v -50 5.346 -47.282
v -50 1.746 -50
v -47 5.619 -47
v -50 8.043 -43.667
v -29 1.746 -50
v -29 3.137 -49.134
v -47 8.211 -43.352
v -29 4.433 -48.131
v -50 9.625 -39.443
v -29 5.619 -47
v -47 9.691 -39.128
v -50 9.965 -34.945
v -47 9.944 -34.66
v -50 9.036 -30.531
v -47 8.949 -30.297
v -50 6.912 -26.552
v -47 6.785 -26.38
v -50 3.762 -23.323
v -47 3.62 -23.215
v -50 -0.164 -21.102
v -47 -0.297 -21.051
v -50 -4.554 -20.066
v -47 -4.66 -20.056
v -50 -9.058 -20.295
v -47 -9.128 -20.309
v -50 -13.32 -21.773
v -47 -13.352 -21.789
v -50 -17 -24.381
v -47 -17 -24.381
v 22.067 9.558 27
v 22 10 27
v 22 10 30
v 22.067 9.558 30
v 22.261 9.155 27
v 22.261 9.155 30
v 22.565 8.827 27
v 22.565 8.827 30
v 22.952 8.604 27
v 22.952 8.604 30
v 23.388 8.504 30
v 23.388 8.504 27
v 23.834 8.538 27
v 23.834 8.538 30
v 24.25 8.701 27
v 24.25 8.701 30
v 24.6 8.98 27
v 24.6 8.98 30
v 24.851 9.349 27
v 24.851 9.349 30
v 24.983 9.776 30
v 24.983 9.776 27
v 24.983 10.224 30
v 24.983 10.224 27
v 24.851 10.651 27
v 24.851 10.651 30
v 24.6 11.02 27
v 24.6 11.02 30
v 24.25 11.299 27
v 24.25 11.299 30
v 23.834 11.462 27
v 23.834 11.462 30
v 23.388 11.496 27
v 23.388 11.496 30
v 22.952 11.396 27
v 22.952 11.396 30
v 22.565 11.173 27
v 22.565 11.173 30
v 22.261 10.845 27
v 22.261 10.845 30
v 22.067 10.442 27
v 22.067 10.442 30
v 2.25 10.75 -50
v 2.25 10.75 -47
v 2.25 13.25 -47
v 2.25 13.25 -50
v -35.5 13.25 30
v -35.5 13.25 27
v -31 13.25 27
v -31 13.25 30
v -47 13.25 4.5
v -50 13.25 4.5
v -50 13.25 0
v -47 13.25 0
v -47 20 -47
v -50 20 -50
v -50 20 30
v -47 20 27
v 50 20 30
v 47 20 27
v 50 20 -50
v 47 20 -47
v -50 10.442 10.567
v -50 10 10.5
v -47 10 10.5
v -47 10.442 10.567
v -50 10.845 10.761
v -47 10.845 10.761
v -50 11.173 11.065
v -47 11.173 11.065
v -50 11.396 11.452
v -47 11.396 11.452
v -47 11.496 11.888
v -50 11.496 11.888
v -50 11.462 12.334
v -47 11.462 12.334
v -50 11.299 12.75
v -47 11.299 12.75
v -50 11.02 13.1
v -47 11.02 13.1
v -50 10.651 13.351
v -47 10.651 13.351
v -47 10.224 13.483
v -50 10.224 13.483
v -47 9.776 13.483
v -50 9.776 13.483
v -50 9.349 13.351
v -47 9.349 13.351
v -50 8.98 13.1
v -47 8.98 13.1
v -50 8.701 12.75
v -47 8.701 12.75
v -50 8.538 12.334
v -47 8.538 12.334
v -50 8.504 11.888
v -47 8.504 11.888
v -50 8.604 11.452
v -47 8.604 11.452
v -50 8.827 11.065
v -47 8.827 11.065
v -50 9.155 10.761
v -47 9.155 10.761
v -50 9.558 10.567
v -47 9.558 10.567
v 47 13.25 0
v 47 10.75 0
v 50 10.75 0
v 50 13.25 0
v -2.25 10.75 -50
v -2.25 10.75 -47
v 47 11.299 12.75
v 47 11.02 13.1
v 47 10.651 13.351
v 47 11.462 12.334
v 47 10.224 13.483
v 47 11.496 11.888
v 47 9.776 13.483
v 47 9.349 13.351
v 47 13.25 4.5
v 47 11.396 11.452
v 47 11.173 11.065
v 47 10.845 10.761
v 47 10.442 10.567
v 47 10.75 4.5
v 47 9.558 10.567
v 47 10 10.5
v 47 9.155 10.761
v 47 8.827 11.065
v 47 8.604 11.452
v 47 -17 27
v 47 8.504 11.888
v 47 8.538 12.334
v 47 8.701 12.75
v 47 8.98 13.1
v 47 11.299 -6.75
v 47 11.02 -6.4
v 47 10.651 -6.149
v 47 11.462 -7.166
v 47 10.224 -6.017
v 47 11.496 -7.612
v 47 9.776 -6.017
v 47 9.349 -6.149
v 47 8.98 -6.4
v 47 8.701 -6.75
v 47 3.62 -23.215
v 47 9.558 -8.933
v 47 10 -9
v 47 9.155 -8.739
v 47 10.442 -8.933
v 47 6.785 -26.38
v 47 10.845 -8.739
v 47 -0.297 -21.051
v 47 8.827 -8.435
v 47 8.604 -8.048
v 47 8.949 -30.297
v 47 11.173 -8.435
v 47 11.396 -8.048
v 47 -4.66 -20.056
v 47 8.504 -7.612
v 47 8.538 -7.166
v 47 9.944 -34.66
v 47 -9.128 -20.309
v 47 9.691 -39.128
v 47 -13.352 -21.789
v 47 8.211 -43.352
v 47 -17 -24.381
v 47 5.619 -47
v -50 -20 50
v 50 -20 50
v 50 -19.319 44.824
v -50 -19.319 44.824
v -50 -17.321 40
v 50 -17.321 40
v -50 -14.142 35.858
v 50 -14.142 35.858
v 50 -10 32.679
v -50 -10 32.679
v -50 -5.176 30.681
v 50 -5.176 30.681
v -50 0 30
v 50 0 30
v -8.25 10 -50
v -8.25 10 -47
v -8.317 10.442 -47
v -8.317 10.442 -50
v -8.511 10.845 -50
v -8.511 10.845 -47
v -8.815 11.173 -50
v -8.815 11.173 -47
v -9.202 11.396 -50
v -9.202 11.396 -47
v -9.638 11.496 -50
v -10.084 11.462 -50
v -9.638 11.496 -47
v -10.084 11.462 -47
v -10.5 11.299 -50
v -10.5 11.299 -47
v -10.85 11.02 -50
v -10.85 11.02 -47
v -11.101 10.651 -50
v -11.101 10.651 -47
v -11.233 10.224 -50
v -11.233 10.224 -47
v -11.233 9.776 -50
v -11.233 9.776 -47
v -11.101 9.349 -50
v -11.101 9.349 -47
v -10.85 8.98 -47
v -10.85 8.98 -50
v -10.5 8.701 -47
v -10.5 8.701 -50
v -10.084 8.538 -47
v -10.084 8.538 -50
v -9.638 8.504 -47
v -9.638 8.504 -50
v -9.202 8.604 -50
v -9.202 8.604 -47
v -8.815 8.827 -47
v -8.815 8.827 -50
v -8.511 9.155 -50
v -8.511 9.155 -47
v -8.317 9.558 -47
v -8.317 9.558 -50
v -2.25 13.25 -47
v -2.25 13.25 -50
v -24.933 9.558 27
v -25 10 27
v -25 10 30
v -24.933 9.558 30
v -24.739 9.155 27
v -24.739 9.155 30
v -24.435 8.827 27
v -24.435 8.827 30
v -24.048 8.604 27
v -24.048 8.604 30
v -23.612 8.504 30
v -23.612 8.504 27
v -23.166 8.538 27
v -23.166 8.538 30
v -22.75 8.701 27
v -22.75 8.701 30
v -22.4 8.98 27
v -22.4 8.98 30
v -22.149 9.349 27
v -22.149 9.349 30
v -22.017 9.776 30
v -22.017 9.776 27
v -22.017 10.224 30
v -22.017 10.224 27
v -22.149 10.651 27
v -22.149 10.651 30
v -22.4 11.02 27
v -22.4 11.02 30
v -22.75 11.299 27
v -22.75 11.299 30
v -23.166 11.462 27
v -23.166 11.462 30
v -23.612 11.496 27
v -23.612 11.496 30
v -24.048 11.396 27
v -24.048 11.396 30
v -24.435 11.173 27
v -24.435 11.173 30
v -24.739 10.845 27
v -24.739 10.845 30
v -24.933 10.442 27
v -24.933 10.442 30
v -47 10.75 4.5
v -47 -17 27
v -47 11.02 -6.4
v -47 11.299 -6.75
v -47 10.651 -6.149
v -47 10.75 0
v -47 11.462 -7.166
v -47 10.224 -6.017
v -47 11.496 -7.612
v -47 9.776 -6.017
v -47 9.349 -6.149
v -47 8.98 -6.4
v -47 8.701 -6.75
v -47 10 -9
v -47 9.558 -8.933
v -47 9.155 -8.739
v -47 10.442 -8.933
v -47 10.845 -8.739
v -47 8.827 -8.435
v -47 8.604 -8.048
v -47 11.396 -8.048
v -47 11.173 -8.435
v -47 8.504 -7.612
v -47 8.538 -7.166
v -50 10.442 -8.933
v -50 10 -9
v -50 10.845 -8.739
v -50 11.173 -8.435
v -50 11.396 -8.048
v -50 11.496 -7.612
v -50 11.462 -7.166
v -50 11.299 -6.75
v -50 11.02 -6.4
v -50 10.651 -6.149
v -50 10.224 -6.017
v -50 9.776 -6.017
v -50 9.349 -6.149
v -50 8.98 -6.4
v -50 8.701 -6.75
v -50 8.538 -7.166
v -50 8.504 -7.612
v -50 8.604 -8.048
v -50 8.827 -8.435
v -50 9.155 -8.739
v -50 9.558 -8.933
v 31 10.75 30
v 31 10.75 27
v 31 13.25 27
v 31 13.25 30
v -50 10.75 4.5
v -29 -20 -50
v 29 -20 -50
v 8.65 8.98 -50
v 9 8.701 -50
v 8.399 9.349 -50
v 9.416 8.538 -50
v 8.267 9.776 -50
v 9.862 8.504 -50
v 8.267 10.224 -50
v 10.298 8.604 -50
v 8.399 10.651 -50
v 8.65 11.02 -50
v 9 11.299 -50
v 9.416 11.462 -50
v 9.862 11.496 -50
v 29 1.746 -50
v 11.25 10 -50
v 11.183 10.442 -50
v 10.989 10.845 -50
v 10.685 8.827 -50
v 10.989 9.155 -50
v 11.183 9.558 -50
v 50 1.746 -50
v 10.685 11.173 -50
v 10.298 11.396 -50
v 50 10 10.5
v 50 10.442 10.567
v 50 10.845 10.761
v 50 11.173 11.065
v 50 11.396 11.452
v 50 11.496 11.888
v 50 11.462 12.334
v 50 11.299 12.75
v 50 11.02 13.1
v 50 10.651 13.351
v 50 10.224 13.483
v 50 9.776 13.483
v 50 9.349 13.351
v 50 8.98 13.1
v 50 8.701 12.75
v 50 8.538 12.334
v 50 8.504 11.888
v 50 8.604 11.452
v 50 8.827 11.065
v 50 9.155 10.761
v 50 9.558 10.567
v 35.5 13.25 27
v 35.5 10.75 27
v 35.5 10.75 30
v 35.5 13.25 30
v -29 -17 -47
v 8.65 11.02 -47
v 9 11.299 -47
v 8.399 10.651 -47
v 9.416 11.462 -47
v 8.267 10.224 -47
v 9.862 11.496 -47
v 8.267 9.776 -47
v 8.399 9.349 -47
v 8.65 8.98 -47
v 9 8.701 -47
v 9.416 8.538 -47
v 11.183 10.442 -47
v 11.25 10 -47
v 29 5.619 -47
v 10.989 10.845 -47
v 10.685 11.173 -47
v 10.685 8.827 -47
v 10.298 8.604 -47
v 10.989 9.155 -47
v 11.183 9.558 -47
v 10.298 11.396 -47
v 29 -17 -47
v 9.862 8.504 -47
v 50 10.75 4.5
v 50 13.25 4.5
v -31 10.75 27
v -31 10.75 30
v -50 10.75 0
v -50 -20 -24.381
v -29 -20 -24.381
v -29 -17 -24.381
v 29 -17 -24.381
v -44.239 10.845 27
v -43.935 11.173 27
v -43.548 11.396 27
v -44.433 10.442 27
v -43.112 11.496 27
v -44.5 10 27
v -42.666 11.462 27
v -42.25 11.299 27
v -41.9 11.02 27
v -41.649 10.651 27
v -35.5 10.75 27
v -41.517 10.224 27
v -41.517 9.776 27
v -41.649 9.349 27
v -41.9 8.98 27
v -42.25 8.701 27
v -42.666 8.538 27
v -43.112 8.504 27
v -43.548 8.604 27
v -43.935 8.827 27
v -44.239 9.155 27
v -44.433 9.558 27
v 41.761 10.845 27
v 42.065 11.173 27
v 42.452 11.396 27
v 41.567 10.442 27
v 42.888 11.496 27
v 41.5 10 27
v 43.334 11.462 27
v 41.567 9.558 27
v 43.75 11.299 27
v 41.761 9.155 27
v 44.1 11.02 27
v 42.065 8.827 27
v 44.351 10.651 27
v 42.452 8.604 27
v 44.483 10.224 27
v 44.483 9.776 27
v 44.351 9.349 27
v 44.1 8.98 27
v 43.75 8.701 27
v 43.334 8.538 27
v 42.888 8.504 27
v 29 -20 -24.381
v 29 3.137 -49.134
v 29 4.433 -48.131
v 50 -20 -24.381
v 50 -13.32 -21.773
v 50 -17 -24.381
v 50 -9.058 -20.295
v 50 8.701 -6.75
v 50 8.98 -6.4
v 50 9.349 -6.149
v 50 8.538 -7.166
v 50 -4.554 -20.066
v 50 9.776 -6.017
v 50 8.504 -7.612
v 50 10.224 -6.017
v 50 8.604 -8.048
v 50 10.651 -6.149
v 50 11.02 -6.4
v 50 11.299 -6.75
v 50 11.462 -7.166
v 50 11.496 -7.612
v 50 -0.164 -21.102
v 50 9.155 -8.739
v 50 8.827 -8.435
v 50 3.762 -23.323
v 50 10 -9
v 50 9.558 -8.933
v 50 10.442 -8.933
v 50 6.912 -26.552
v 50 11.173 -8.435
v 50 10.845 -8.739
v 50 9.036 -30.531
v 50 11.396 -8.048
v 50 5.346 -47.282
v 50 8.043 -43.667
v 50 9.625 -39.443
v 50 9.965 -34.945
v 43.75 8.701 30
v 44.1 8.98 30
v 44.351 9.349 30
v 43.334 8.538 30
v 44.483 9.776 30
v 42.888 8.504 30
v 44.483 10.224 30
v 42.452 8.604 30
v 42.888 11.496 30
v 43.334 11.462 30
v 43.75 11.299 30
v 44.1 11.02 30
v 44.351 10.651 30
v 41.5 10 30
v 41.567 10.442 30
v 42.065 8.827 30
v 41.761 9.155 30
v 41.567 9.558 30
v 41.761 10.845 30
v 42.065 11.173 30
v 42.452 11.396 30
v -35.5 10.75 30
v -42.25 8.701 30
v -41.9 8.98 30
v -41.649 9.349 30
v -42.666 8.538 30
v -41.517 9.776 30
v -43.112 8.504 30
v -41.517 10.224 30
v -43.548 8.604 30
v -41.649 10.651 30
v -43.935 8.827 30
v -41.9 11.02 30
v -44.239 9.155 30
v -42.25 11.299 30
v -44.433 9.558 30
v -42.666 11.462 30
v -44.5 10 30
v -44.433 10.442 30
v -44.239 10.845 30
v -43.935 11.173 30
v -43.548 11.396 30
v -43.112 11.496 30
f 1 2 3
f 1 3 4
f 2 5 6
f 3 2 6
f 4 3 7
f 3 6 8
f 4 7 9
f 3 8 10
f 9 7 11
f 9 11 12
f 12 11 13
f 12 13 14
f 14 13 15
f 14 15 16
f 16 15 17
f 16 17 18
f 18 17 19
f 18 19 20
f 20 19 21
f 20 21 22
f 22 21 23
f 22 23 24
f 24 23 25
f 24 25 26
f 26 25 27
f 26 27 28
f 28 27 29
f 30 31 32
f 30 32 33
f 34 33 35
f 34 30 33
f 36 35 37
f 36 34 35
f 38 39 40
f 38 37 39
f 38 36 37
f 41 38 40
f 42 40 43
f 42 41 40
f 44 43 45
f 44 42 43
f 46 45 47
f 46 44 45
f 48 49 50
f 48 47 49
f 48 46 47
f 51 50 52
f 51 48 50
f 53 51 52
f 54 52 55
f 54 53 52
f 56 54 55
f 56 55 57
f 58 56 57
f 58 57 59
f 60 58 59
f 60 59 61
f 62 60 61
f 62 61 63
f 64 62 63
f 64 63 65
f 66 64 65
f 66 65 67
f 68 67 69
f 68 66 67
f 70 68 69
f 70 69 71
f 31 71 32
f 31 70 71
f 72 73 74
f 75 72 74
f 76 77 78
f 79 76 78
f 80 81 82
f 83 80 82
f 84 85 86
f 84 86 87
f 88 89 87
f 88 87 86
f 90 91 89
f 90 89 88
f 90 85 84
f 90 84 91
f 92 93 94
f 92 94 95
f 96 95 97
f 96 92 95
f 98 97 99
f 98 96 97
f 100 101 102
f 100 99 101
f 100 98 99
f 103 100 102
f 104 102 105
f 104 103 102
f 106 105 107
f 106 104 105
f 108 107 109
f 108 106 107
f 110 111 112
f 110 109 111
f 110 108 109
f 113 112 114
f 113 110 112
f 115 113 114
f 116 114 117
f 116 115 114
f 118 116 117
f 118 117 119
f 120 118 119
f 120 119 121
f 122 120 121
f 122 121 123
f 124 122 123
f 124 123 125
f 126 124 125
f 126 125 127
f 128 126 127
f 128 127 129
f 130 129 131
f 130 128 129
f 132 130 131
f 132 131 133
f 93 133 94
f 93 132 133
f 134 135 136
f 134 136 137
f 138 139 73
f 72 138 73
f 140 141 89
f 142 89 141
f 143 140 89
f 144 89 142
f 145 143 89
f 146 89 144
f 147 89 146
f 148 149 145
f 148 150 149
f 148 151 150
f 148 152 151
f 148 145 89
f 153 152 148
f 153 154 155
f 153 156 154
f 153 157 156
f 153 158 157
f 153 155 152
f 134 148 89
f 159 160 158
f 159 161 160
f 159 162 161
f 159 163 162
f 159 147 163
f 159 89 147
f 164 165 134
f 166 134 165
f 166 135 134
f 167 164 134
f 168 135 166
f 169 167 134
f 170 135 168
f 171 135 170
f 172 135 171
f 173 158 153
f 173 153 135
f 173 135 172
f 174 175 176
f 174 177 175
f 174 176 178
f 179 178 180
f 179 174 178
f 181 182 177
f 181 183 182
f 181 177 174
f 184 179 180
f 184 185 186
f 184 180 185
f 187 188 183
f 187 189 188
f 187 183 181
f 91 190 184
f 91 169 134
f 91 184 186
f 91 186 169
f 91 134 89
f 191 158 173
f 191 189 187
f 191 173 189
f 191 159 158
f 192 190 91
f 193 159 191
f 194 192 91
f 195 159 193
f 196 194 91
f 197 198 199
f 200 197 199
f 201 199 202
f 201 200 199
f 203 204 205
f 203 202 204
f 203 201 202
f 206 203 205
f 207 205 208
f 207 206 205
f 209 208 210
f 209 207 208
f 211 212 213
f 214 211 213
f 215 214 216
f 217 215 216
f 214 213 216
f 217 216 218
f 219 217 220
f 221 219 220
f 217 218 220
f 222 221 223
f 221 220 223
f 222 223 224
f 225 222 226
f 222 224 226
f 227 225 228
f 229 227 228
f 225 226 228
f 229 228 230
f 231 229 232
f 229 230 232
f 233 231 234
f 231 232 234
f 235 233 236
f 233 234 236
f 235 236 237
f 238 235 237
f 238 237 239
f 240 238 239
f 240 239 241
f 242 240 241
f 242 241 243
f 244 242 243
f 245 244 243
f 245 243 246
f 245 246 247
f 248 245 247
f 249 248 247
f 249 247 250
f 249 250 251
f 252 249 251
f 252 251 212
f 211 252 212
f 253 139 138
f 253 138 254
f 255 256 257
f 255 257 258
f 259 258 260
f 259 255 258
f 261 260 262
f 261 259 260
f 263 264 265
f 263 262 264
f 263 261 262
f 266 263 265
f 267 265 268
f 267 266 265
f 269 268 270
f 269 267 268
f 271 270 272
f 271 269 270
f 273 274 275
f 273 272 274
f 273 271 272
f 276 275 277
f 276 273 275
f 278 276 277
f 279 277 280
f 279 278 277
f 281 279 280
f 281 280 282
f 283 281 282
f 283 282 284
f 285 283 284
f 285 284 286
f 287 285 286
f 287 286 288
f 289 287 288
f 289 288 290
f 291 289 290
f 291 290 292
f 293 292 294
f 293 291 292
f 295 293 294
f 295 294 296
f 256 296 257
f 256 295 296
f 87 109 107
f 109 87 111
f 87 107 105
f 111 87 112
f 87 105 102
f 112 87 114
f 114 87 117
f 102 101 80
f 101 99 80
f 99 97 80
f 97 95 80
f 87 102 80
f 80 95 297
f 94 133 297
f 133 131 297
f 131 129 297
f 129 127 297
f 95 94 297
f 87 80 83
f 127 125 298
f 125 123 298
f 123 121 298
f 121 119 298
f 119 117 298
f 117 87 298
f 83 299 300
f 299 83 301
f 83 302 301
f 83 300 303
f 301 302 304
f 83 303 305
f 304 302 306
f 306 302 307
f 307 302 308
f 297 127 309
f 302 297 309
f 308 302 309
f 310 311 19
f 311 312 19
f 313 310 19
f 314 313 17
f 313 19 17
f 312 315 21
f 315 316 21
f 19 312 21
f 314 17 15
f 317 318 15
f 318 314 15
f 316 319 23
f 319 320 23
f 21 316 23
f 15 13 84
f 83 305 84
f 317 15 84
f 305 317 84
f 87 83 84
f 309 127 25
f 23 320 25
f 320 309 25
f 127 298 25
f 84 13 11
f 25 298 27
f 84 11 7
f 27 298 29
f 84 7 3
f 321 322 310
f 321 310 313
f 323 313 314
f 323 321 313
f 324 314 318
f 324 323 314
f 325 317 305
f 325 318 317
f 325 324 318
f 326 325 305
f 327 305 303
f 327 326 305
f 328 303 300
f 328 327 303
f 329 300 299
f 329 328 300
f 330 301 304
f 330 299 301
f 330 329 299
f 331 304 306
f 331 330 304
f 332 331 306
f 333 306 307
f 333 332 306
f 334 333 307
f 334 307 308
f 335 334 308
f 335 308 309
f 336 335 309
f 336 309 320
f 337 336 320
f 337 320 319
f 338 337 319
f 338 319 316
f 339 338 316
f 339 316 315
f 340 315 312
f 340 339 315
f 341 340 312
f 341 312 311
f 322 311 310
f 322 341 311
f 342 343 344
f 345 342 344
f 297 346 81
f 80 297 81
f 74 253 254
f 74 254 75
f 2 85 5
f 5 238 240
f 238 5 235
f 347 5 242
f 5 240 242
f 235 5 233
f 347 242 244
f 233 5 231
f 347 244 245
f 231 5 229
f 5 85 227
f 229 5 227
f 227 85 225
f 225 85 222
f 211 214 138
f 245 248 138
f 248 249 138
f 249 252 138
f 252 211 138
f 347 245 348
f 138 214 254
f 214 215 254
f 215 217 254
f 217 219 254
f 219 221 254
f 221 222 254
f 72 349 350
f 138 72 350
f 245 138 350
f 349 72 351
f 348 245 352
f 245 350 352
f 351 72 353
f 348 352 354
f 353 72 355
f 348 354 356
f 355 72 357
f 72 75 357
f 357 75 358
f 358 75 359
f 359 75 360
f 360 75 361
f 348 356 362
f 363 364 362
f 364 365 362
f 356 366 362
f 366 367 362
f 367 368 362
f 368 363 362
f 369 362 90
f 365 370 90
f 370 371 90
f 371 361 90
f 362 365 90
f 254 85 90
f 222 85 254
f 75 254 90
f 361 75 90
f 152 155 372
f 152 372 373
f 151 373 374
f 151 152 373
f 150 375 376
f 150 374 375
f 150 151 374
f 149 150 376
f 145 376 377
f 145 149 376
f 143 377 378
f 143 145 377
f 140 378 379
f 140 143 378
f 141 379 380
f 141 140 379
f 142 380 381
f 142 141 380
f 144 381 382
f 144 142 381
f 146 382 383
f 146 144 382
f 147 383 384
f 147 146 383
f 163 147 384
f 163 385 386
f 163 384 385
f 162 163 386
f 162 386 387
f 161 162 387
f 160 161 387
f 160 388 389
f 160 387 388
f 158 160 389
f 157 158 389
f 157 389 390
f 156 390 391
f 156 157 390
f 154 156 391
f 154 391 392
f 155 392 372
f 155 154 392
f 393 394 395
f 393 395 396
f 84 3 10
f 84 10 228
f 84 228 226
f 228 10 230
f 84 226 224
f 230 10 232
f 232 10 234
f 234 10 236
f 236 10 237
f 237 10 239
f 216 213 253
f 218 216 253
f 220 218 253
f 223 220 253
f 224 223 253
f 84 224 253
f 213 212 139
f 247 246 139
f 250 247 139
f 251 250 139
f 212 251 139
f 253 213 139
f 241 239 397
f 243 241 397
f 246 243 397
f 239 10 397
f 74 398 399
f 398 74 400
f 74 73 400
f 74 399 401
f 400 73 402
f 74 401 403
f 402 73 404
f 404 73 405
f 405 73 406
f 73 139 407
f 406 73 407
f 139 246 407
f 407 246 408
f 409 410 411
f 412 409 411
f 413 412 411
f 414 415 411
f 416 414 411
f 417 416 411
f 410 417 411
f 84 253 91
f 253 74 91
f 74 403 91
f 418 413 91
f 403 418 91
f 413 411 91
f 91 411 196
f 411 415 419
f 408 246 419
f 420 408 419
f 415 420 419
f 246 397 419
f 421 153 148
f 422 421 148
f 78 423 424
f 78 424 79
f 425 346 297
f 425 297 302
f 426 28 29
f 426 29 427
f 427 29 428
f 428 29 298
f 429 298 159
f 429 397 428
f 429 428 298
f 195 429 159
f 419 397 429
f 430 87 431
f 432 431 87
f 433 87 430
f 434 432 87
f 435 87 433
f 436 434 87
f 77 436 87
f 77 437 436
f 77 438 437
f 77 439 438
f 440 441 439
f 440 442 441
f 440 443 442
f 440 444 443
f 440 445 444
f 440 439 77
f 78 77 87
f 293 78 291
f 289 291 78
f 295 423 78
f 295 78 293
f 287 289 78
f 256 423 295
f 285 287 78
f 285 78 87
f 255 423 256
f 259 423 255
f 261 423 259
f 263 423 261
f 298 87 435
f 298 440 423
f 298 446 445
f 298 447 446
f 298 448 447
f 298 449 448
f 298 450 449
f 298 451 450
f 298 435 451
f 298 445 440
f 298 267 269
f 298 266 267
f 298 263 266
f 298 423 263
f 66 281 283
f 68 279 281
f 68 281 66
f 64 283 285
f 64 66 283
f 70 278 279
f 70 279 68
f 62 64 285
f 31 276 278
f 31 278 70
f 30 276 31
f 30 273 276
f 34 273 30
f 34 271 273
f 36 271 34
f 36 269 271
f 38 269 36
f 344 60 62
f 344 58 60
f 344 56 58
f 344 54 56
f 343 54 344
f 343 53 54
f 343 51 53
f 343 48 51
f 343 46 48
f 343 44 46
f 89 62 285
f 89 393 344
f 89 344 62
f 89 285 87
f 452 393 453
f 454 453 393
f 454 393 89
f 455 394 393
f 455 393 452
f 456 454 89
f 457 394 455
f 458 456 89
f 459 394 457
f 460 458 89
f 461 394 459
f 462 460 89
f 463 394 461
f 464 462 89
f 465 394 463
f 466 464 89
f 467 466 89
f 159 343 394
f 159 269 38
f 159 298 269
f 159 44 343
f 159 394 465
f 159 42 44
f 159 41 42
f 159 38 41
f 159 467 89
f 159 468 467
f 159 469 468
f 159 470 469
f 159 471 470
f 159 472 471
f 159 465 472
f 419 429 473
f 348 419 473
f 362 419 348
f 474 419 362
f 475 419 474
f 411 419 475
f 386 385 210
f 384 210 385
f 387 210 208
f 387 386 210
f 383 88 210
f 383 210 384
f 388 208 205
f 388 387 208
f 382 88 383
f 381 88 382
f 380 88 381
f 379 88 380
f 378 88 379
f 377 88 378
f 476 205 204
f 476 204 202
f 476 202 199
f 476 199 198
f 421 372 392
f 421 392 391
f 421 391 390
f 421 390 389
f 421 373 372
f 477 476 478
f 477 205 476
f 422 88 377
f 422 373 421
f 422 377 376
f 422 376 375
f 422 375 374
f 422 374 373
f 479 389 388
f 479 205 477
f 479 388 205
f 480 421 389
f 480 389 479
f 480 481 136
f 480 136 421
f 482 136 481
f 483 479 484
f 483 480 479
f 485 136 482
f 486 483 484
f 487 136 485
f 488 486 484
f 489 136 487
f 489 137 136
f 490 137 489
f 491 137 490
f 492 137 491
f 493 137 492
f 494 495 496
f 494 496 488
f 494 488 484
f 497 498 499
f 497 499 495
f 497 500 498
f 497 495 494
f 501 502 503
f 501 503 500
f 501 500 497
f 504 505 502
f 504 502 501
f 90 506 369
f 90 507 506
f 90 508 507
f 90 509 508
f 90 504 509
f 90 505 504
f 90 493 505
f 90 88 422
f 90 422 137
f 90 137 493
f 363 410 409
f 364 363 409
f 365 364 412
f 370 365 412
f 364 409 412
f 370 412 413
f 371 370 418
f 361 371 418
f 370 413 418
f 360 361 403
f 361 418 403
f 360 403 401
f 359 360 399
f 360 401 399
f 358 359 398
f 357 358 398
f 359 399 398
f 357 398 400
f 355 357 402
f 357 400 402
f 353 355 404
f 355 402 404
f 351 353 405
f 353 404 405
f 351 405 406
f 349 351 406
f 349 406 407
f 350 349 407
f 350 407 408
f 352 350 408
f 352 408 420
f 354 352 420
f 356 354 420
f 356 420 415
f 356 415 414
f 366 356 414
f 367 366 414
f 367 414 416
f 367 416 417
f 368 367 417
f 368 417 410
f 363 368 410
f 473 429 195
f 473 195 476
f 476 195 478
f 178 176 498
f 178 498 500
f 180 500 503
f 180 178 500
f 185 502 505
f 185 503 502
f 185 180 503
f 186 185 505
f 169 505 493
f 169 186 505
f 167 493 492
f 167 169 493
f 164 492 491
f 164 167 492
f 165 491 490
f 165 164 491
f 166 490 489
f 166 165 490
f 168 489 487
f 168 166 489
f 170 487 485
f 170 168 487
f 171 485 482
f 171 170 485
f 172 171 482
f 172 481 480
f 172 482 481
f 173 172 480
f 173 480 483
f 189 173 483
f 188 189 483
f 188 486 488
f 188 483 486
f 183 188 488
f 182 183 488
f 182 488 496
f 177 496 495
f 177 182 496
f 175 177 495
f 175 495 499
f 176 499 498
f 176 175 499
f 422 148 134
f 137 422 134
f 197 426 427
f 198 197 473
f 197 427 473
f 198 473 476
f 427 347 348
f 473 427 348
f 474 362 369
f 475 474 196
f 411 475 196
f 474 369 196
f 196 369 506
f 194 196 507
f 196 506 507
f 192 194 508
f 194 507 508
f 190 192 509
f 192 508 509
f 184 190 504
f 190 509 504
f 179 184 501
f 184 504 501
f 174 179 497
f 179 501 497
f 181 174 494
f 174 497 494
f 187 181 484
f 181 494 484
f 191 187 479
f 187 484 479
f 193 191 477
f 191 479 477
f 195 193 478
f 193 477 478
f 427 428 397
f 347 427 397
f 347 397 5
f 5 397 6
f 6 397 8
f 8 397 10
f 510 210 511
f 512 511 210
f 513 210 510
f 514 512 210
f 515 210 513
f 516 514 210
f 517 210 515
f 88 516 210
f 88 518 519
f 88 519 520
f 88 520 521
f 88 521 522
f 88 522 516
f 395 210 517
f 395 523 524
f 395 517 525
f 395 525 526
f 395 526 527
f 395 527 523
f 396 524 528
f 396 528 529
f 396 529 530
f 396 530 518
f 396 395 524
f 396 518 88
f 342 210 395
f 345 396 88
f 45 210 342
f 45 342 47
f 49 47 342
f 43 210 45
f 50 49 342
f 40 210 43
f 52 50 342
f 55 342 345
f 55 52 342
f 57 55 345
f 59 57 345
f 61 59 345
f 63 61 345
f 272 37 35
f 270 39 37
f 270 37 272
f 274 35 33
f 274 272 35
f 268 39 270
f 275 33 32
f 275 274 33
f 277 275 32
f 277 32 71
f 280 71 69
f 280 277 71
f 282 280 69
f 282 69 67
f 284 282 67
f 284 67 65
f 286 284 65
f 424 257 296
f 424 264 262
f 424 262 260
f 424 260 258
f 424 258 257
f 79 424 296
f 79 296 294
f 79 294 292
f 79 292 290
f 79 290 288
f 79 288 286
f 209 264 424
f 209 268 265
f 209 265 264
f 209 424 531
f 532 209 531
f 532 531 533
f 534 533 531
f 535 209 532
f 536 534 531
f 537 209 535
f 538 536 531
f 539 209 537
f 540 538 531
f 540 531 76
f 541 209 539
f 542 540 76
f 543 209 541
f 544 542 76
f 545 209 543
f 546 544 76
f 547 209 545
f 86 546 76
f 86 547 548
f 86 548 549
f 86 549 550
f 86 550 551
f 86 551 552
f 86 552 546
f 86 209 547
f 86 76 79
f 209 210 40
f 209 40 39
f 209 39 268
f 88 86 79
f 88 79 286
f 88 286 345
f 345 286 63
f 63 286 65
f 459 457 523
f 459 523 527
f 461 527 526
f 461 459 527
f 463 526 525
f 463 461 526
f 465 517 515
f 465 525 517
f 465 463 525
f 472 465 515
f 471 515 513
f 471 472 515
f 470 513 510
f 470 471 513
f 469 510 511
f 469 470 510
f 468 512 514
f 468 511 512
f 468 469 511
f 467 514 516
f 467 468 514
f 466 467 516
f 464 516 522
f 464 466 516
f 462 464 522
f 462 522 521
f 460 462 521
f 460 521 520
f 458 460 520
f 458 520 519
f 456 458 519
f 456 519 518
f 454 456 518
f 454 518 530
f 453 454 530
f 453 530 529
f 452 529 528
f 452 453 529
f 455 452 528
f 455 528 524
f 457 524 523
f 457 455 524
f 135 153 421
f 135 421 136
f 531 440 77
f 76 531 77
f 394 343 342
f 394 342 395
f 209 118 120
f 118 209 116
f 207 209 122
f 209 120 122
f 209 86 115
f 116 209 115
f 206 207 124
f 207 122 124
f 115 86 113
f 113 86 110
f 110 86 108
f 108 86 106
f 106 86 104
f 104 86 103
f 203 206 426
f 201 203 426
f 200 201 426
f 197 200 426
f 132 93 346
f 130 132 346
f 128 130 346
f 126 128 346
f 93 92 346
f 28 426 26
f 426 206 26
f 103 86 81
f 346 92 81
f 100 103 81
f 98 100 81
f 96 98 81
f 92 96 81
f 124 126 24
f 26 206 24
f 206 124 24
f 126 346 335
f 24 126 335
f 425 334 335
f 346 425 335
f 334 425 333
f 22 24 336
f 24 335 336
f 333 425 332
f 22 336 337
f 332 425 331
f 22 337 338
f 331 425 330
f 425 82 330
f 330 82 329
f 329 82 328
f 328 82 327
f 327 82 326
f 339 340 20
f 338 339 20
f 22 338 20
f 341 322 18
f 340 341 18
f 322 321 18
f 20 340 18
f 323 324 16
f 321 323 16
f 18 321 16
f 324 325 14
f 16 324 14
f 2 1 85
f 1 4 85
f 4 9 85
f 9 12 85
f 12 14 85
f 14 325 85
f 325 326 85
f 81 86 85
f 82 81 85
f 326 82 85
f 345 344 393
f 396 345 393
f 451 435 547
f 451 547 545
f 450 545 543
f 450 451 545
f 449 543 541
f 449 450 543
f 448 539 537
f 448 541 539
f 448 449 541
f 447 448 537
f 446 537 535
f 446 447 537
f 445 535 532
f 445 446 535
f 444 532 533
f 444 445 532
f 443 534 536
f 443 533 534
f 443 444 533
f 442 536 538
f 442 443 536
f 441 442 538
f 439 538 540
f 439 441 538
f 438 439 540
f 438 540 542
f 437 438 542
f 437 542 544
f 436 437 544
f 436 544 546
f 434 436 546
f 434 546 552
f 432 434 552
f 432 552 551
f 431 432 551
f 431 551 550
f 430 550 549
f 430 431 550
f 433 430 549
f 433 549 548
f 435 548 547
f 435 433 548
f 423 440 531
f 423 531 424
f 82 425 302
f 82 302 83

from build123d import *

# Parameters (mm, degrees)
ESBO_O1_W                   = 100
ESBO_O1_H                   = 100
RESSALTO_EXTRUS_O1_DEPTH    = 20
CORTE_EXTRUS_O1_DEPTH       = 74.484692283
CORTE_EXTRUS_O1_DEPTH_BACK  = 74.484692283
ESBO_O2_R                   = 20
ESBO_O3_W                   = 94
ESBO_O3_H                   = 74
CORTE_EXTRUS_O2_DEPTH       = 74.484692283
ESBO_O5_W                   = 94
ESBO_O5_H                   = 74
CORTE_EXTRUS_O3_DEPTH       = 17
CORTE_EXTRUS_O4_START       = 50
ESBO_O6_R                   = 16
CORTE_EXTRUS_O4_DEPTH       = 21
CORTE_EXTRUS_O5_START       = -29
ESBO_O6_4_R                 = 16
CORTE_EXTRUS_O5_DEPTH       = 21
ESBO_O7_W                   = 21
ESBO_O7_H                   = 3.872983347
CORTE_EXTRUS_O6_DEPTH       = 21
ESBO_O8_R                   = 1.5
ESBO_O8_W                   = 4.5
ESBO_O8_H                   = 2.5
CORTE_EXTRUS_O8_DEPTH       = 74.484692283
ESBO_O9_R                   = 1.5
ESBO_O9_W                   = 4.5
ESBO_O9_H                   = 2.5
CORTE_EXTRUS_O9_DEPTH       = 74.484692283
CORTE_EXTRUS_O10_DEPTH      = 74.484692283
CORTE_EXTRUS_O10_DEPTH_BACK = 74.484692283
ESBO_O10_R                  = 1.5
ESBO_O10_W                  = 4.5
ESBO_O10_H                  = 2.5


with BuildPart() as part:
    # Esboço1 → Ressalto-extrusão1 (new, symmetric)
    with BuildSketch(Plane(origin=(0, 0, 0), x_dir=(1, 0, 0), z_dir=(0, 1, 0))):
        Rectangle(ESBO_O1_W, ESBO_O1_H)
    extrude(amount=RESSALTO_EXTRUS_O1_DEPTH, both=True)

    # Esboço2 → Corte-extrusão1 (cut, two sides: drawn at the far end of the back side and taken through both)
    with BuildSketch(Plane(origin=(0, 0, 0), x_dir=(0, 0, -1), z_dir=(1, 0, 0)).offset(-CORTE_EXTRUS_O1_DEPTH_BACK)):
        with BuildLine():
            Line((-30, 20), (-50, 20))
            ThreePointArc((-50, 20), (-35.857864376, 14.142135624), (-30, 0))
            Line((-30, 0), (-30, 20))
        make_face()
        with Locations((-50, 0)):
            Circle(ESBO_O2_R)
    extrude(amount=CORTE_EXTRUS_O1_DEPTH + CORTE_EXTRUS_O1_DEPTH_BACK, mode=Mode.SUBTRACT)

    # Esboço3 → Corte-extrusão2 (cut, through all)
    with BuildSketch(Plane(origin=(0, 0, 0), x_dir=(1, 0, 0), z_dir=(0, 1, 0))):
        with Locations((0, 10)):
            Rectangle(ESBO_O3_W, ESBO_O3_H)
    extrude(amount=CORTE_EXTRUS_O2_DEPTH, mode=Mode.SUBTRACT)

    # Esboço5 → Corte-extrusão3 (cut)
    with BuildSketch(Plane(origin=(0, 0, 0), x_dir=(1, 0, 0), z_dir=(0, 1, 0))):
        with Locations((0, 10)):
            Rectangle(ESBO_O5_W, ESBO_O5_H)
    extrude(amount=-CORTE_EXTRUS_O3_DEPTH, mode=Mode.SUBTRACT)

    # Esboço6 → Corte-extrusão4 (cut)
    with BuildSketch(Plane(origin=(0, 0, 0), x_dir=(0, 0, -1), z_dir=(1, 0, 0)).offset(CORTE_EXTRUS_O4_START)):
        with Locations((36, -6)):
            Circle(ESBO_O6_R)
        with BuildLine():
            ThreePointArc((52, -6), (47.313708499, -17.313708499), (36, -22))
            Line((36, -22), (52, -22))
            Line((52, -22), (52, -6))
        make_face()
    extrude(amount=-CORTE_EXTRUS_O4_DEPTH, mode=Mode.SUBTRACT)

    # Esboço6<4> → Corte-extrusão5 (cut)
    with BuildSketch(Plane(origin=(0, 0, 0), x_dir=(0, 0, -1), z_dir=(1, 0, 0)).offset(CORTE_EXTRUS_O5_START)):
        with BuildLine():
            ThreePointArc((52, -6), (47.313708499, -17.313708499), (36, -22))
            Line((36, -22), (52, -22))
            Line((52, -22), (52, -6))
        make_face()
        with Locations((36, -6)):
            Circle(ESBO_O6_4_R)
    extrude(amount=-CORTE_EXTRUS_O5_DEPTH, mode=Mode.SUBTRACT)

    # Esboço7 → Corte-extrusão6 (cut)
    with BuildSketch(Plane(origin=(0, 0, 0), x_dir=(1, 0, 0), z_dir=(0, 1, 0))):
        with Locations((-39.5, 26.317541635)):
            Rectangle(ESBO_O7_W, ESBO_O7_H)
        with Locations((39.5, 26.317541635)):
            Rectangle(ESBO_O7_W, ESBO_O7_H)
    extrude(amount=-CORTE_EXTRUS_O6_DEPTH, mode=Mode.SUBTRACT)

    # Esboço8 → Corte-extrusão8 (cut, through all)
    with BuildSketch(Plane.XY):
        with Locations(Location((-43, 10, 0), (0, 0, 180))):
            Circle(ESBO_O8_R)
        with Locations(Location((-23.5, 10, 0), (0, 0, 180))):
            Circle(ESBO_O8_R)
        with Locations(Location((23.5, 10, 0), (0, 0, 180))):
            Circle(ESBO_O8_R)
        with Locations(Location((43, 10, 0), (0, 0, 180))):
            Circle(ESBO_O8_R)
        with Locations((33.25, 12)):
            Rectangle(ESBO_O8_W, ESBO_O8_H)
        with Locations((-33.25, 12)):
            Rectangle(ESBO_O8_W, ESBO_O8_H)
    extrude(amount=CORTE_EXTRUS_O8_DEPTH, mode=Mode.SUBTRACT)

    # Esboço9 → Corte-extrusão9 (cut, through all)
    with BuildSketch(Plane.XY):
        with Locations((-9.75, 10)):
            Circle(ESBO_O9_R)
        with Locations((9.75, 10)):
            Circle(ESBO_O9_R)
        with Locations((0, 12)):
            Rectangle(ESBO_O9_W, ESBO_O9_H)
    extrude(amount=-CORTE_EXTRUS_O9_DEPTH, mode=Mode.SUBTRACT)

    # Esboço10 → Corte-extrusão10 (cut, two sides: drawn at the far end of the back side and taken through both)
    with BuildSketch(Plane(origin=(0, 0, 0), x_dir=(0, 0, -1), z_dir=(1, 0, 0)).offset(-CORTE_EXTRUS_O10_DEPTH_BACK)):
        with Locations((-12, 10)):
            Circle(ESBO_O10_R)
        with Locations((7.5, 10)):
            Circle(ESBO_O10_R)
        with Locations((-2.25, 12)):
            Rectangle(ESBO_O10_W, ESBO_O10_H)
    extrude(amount=CORTE_EXTRUS_O10_DEPTH + CORTE_EXTRUS_O10_DEPTH_BACK, mode=Mode.SUBTRACT)


solid = part.part
